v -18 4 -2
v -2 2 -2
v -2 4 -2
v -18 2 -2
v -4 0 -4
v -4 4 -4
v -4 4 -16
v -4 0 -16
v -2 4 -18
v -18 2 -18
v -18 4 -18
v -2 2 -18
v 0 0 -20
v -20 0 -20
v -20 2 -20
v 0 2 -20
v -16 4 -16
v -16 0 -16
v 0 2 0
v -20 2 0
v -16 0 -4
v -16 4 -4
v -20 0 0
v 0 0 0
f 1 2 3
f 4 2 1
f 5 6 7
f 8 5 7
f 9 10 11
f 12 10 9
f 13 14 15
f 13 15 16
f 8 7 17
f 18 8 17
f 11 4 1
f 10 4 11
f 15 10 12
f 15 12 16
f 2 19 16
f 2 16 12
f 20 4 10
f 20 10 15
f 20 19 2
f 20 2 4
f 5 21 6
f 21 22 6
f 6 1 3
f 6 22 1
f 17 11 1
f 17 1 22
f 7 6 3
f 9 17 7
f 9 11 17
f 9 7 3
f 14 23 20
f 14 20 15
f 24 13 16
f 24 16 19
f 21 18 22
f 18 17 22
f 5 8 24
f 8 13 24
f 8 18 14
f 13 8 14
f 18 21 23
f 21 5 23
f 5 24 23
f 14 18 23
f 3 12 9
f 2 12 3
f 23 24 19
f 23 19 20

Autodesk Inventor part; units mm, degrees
ref_plane "YZ Plane" through (0, 0, 0) normal (1, 0, 0) x (0, 1, 0)
ref_plane "XZ Plane" through (0, 0, 0) normal (0, 1, 0) x (-1, 0, 0)
ref_plane "XY Plane" through (0, 0, 0) normal (0, 0, 1) x (1, 0, 0)
sketch "Sketch1" plane through (0, 0, 0) normal (0, 1, 0) x (-1, 0, 0)
  line L0 (0, 0) -> (20, 0)
  line L1 (20, 0) -> (20, -20)
  line L2 (20, -20) -> (0, -20)
  line L3 (0, -20) -> (0, 0)
  dimension "d0" = 20
  dimension "d1" = 20
extrude "Extrusion1" add sketch "Sketch1" along normal blind 2
sketch "Sketch2" plane through (0, 2, 0) normal (0, 1, 0) x (1, 0, 0)
  line L0 (0, 20) -> (-20, 20) projected
  line L1 (-20, 20) -> (-20, 0) projected
  line L2 (-20, 0) -> (0, 0) projected
  line L3 (0, 0) -> (0, 20) projected
  line L4 (-18, 2) -> (-18, 18)
  line L5 (-18, 18) -> (-2, 18)
  line L6 (-2, 18) -> (-2, 2)
  line L7 (-2, 2) -> (-18, 2)
  line L8 (-16, 16) -> (-16, 4)
  line L9 (-16, 4) -> (-4, 4)
  line L10 (-4, 4) -> (-4, 16)
  line L11 (-4, 16) -> (-16, 16)
  dimension "d4" = 2
  dimension "d5" = 2
extrude "Extrusion2" add sketch "Sketch2" along normal blind 2 contours L4 L5 L6 L7
extrude "Extrusion3" cut sketch "Sketch2" against normal blind 10 contours L11 L10 L9 L8
properties part number "latticeChamberCapv4"
